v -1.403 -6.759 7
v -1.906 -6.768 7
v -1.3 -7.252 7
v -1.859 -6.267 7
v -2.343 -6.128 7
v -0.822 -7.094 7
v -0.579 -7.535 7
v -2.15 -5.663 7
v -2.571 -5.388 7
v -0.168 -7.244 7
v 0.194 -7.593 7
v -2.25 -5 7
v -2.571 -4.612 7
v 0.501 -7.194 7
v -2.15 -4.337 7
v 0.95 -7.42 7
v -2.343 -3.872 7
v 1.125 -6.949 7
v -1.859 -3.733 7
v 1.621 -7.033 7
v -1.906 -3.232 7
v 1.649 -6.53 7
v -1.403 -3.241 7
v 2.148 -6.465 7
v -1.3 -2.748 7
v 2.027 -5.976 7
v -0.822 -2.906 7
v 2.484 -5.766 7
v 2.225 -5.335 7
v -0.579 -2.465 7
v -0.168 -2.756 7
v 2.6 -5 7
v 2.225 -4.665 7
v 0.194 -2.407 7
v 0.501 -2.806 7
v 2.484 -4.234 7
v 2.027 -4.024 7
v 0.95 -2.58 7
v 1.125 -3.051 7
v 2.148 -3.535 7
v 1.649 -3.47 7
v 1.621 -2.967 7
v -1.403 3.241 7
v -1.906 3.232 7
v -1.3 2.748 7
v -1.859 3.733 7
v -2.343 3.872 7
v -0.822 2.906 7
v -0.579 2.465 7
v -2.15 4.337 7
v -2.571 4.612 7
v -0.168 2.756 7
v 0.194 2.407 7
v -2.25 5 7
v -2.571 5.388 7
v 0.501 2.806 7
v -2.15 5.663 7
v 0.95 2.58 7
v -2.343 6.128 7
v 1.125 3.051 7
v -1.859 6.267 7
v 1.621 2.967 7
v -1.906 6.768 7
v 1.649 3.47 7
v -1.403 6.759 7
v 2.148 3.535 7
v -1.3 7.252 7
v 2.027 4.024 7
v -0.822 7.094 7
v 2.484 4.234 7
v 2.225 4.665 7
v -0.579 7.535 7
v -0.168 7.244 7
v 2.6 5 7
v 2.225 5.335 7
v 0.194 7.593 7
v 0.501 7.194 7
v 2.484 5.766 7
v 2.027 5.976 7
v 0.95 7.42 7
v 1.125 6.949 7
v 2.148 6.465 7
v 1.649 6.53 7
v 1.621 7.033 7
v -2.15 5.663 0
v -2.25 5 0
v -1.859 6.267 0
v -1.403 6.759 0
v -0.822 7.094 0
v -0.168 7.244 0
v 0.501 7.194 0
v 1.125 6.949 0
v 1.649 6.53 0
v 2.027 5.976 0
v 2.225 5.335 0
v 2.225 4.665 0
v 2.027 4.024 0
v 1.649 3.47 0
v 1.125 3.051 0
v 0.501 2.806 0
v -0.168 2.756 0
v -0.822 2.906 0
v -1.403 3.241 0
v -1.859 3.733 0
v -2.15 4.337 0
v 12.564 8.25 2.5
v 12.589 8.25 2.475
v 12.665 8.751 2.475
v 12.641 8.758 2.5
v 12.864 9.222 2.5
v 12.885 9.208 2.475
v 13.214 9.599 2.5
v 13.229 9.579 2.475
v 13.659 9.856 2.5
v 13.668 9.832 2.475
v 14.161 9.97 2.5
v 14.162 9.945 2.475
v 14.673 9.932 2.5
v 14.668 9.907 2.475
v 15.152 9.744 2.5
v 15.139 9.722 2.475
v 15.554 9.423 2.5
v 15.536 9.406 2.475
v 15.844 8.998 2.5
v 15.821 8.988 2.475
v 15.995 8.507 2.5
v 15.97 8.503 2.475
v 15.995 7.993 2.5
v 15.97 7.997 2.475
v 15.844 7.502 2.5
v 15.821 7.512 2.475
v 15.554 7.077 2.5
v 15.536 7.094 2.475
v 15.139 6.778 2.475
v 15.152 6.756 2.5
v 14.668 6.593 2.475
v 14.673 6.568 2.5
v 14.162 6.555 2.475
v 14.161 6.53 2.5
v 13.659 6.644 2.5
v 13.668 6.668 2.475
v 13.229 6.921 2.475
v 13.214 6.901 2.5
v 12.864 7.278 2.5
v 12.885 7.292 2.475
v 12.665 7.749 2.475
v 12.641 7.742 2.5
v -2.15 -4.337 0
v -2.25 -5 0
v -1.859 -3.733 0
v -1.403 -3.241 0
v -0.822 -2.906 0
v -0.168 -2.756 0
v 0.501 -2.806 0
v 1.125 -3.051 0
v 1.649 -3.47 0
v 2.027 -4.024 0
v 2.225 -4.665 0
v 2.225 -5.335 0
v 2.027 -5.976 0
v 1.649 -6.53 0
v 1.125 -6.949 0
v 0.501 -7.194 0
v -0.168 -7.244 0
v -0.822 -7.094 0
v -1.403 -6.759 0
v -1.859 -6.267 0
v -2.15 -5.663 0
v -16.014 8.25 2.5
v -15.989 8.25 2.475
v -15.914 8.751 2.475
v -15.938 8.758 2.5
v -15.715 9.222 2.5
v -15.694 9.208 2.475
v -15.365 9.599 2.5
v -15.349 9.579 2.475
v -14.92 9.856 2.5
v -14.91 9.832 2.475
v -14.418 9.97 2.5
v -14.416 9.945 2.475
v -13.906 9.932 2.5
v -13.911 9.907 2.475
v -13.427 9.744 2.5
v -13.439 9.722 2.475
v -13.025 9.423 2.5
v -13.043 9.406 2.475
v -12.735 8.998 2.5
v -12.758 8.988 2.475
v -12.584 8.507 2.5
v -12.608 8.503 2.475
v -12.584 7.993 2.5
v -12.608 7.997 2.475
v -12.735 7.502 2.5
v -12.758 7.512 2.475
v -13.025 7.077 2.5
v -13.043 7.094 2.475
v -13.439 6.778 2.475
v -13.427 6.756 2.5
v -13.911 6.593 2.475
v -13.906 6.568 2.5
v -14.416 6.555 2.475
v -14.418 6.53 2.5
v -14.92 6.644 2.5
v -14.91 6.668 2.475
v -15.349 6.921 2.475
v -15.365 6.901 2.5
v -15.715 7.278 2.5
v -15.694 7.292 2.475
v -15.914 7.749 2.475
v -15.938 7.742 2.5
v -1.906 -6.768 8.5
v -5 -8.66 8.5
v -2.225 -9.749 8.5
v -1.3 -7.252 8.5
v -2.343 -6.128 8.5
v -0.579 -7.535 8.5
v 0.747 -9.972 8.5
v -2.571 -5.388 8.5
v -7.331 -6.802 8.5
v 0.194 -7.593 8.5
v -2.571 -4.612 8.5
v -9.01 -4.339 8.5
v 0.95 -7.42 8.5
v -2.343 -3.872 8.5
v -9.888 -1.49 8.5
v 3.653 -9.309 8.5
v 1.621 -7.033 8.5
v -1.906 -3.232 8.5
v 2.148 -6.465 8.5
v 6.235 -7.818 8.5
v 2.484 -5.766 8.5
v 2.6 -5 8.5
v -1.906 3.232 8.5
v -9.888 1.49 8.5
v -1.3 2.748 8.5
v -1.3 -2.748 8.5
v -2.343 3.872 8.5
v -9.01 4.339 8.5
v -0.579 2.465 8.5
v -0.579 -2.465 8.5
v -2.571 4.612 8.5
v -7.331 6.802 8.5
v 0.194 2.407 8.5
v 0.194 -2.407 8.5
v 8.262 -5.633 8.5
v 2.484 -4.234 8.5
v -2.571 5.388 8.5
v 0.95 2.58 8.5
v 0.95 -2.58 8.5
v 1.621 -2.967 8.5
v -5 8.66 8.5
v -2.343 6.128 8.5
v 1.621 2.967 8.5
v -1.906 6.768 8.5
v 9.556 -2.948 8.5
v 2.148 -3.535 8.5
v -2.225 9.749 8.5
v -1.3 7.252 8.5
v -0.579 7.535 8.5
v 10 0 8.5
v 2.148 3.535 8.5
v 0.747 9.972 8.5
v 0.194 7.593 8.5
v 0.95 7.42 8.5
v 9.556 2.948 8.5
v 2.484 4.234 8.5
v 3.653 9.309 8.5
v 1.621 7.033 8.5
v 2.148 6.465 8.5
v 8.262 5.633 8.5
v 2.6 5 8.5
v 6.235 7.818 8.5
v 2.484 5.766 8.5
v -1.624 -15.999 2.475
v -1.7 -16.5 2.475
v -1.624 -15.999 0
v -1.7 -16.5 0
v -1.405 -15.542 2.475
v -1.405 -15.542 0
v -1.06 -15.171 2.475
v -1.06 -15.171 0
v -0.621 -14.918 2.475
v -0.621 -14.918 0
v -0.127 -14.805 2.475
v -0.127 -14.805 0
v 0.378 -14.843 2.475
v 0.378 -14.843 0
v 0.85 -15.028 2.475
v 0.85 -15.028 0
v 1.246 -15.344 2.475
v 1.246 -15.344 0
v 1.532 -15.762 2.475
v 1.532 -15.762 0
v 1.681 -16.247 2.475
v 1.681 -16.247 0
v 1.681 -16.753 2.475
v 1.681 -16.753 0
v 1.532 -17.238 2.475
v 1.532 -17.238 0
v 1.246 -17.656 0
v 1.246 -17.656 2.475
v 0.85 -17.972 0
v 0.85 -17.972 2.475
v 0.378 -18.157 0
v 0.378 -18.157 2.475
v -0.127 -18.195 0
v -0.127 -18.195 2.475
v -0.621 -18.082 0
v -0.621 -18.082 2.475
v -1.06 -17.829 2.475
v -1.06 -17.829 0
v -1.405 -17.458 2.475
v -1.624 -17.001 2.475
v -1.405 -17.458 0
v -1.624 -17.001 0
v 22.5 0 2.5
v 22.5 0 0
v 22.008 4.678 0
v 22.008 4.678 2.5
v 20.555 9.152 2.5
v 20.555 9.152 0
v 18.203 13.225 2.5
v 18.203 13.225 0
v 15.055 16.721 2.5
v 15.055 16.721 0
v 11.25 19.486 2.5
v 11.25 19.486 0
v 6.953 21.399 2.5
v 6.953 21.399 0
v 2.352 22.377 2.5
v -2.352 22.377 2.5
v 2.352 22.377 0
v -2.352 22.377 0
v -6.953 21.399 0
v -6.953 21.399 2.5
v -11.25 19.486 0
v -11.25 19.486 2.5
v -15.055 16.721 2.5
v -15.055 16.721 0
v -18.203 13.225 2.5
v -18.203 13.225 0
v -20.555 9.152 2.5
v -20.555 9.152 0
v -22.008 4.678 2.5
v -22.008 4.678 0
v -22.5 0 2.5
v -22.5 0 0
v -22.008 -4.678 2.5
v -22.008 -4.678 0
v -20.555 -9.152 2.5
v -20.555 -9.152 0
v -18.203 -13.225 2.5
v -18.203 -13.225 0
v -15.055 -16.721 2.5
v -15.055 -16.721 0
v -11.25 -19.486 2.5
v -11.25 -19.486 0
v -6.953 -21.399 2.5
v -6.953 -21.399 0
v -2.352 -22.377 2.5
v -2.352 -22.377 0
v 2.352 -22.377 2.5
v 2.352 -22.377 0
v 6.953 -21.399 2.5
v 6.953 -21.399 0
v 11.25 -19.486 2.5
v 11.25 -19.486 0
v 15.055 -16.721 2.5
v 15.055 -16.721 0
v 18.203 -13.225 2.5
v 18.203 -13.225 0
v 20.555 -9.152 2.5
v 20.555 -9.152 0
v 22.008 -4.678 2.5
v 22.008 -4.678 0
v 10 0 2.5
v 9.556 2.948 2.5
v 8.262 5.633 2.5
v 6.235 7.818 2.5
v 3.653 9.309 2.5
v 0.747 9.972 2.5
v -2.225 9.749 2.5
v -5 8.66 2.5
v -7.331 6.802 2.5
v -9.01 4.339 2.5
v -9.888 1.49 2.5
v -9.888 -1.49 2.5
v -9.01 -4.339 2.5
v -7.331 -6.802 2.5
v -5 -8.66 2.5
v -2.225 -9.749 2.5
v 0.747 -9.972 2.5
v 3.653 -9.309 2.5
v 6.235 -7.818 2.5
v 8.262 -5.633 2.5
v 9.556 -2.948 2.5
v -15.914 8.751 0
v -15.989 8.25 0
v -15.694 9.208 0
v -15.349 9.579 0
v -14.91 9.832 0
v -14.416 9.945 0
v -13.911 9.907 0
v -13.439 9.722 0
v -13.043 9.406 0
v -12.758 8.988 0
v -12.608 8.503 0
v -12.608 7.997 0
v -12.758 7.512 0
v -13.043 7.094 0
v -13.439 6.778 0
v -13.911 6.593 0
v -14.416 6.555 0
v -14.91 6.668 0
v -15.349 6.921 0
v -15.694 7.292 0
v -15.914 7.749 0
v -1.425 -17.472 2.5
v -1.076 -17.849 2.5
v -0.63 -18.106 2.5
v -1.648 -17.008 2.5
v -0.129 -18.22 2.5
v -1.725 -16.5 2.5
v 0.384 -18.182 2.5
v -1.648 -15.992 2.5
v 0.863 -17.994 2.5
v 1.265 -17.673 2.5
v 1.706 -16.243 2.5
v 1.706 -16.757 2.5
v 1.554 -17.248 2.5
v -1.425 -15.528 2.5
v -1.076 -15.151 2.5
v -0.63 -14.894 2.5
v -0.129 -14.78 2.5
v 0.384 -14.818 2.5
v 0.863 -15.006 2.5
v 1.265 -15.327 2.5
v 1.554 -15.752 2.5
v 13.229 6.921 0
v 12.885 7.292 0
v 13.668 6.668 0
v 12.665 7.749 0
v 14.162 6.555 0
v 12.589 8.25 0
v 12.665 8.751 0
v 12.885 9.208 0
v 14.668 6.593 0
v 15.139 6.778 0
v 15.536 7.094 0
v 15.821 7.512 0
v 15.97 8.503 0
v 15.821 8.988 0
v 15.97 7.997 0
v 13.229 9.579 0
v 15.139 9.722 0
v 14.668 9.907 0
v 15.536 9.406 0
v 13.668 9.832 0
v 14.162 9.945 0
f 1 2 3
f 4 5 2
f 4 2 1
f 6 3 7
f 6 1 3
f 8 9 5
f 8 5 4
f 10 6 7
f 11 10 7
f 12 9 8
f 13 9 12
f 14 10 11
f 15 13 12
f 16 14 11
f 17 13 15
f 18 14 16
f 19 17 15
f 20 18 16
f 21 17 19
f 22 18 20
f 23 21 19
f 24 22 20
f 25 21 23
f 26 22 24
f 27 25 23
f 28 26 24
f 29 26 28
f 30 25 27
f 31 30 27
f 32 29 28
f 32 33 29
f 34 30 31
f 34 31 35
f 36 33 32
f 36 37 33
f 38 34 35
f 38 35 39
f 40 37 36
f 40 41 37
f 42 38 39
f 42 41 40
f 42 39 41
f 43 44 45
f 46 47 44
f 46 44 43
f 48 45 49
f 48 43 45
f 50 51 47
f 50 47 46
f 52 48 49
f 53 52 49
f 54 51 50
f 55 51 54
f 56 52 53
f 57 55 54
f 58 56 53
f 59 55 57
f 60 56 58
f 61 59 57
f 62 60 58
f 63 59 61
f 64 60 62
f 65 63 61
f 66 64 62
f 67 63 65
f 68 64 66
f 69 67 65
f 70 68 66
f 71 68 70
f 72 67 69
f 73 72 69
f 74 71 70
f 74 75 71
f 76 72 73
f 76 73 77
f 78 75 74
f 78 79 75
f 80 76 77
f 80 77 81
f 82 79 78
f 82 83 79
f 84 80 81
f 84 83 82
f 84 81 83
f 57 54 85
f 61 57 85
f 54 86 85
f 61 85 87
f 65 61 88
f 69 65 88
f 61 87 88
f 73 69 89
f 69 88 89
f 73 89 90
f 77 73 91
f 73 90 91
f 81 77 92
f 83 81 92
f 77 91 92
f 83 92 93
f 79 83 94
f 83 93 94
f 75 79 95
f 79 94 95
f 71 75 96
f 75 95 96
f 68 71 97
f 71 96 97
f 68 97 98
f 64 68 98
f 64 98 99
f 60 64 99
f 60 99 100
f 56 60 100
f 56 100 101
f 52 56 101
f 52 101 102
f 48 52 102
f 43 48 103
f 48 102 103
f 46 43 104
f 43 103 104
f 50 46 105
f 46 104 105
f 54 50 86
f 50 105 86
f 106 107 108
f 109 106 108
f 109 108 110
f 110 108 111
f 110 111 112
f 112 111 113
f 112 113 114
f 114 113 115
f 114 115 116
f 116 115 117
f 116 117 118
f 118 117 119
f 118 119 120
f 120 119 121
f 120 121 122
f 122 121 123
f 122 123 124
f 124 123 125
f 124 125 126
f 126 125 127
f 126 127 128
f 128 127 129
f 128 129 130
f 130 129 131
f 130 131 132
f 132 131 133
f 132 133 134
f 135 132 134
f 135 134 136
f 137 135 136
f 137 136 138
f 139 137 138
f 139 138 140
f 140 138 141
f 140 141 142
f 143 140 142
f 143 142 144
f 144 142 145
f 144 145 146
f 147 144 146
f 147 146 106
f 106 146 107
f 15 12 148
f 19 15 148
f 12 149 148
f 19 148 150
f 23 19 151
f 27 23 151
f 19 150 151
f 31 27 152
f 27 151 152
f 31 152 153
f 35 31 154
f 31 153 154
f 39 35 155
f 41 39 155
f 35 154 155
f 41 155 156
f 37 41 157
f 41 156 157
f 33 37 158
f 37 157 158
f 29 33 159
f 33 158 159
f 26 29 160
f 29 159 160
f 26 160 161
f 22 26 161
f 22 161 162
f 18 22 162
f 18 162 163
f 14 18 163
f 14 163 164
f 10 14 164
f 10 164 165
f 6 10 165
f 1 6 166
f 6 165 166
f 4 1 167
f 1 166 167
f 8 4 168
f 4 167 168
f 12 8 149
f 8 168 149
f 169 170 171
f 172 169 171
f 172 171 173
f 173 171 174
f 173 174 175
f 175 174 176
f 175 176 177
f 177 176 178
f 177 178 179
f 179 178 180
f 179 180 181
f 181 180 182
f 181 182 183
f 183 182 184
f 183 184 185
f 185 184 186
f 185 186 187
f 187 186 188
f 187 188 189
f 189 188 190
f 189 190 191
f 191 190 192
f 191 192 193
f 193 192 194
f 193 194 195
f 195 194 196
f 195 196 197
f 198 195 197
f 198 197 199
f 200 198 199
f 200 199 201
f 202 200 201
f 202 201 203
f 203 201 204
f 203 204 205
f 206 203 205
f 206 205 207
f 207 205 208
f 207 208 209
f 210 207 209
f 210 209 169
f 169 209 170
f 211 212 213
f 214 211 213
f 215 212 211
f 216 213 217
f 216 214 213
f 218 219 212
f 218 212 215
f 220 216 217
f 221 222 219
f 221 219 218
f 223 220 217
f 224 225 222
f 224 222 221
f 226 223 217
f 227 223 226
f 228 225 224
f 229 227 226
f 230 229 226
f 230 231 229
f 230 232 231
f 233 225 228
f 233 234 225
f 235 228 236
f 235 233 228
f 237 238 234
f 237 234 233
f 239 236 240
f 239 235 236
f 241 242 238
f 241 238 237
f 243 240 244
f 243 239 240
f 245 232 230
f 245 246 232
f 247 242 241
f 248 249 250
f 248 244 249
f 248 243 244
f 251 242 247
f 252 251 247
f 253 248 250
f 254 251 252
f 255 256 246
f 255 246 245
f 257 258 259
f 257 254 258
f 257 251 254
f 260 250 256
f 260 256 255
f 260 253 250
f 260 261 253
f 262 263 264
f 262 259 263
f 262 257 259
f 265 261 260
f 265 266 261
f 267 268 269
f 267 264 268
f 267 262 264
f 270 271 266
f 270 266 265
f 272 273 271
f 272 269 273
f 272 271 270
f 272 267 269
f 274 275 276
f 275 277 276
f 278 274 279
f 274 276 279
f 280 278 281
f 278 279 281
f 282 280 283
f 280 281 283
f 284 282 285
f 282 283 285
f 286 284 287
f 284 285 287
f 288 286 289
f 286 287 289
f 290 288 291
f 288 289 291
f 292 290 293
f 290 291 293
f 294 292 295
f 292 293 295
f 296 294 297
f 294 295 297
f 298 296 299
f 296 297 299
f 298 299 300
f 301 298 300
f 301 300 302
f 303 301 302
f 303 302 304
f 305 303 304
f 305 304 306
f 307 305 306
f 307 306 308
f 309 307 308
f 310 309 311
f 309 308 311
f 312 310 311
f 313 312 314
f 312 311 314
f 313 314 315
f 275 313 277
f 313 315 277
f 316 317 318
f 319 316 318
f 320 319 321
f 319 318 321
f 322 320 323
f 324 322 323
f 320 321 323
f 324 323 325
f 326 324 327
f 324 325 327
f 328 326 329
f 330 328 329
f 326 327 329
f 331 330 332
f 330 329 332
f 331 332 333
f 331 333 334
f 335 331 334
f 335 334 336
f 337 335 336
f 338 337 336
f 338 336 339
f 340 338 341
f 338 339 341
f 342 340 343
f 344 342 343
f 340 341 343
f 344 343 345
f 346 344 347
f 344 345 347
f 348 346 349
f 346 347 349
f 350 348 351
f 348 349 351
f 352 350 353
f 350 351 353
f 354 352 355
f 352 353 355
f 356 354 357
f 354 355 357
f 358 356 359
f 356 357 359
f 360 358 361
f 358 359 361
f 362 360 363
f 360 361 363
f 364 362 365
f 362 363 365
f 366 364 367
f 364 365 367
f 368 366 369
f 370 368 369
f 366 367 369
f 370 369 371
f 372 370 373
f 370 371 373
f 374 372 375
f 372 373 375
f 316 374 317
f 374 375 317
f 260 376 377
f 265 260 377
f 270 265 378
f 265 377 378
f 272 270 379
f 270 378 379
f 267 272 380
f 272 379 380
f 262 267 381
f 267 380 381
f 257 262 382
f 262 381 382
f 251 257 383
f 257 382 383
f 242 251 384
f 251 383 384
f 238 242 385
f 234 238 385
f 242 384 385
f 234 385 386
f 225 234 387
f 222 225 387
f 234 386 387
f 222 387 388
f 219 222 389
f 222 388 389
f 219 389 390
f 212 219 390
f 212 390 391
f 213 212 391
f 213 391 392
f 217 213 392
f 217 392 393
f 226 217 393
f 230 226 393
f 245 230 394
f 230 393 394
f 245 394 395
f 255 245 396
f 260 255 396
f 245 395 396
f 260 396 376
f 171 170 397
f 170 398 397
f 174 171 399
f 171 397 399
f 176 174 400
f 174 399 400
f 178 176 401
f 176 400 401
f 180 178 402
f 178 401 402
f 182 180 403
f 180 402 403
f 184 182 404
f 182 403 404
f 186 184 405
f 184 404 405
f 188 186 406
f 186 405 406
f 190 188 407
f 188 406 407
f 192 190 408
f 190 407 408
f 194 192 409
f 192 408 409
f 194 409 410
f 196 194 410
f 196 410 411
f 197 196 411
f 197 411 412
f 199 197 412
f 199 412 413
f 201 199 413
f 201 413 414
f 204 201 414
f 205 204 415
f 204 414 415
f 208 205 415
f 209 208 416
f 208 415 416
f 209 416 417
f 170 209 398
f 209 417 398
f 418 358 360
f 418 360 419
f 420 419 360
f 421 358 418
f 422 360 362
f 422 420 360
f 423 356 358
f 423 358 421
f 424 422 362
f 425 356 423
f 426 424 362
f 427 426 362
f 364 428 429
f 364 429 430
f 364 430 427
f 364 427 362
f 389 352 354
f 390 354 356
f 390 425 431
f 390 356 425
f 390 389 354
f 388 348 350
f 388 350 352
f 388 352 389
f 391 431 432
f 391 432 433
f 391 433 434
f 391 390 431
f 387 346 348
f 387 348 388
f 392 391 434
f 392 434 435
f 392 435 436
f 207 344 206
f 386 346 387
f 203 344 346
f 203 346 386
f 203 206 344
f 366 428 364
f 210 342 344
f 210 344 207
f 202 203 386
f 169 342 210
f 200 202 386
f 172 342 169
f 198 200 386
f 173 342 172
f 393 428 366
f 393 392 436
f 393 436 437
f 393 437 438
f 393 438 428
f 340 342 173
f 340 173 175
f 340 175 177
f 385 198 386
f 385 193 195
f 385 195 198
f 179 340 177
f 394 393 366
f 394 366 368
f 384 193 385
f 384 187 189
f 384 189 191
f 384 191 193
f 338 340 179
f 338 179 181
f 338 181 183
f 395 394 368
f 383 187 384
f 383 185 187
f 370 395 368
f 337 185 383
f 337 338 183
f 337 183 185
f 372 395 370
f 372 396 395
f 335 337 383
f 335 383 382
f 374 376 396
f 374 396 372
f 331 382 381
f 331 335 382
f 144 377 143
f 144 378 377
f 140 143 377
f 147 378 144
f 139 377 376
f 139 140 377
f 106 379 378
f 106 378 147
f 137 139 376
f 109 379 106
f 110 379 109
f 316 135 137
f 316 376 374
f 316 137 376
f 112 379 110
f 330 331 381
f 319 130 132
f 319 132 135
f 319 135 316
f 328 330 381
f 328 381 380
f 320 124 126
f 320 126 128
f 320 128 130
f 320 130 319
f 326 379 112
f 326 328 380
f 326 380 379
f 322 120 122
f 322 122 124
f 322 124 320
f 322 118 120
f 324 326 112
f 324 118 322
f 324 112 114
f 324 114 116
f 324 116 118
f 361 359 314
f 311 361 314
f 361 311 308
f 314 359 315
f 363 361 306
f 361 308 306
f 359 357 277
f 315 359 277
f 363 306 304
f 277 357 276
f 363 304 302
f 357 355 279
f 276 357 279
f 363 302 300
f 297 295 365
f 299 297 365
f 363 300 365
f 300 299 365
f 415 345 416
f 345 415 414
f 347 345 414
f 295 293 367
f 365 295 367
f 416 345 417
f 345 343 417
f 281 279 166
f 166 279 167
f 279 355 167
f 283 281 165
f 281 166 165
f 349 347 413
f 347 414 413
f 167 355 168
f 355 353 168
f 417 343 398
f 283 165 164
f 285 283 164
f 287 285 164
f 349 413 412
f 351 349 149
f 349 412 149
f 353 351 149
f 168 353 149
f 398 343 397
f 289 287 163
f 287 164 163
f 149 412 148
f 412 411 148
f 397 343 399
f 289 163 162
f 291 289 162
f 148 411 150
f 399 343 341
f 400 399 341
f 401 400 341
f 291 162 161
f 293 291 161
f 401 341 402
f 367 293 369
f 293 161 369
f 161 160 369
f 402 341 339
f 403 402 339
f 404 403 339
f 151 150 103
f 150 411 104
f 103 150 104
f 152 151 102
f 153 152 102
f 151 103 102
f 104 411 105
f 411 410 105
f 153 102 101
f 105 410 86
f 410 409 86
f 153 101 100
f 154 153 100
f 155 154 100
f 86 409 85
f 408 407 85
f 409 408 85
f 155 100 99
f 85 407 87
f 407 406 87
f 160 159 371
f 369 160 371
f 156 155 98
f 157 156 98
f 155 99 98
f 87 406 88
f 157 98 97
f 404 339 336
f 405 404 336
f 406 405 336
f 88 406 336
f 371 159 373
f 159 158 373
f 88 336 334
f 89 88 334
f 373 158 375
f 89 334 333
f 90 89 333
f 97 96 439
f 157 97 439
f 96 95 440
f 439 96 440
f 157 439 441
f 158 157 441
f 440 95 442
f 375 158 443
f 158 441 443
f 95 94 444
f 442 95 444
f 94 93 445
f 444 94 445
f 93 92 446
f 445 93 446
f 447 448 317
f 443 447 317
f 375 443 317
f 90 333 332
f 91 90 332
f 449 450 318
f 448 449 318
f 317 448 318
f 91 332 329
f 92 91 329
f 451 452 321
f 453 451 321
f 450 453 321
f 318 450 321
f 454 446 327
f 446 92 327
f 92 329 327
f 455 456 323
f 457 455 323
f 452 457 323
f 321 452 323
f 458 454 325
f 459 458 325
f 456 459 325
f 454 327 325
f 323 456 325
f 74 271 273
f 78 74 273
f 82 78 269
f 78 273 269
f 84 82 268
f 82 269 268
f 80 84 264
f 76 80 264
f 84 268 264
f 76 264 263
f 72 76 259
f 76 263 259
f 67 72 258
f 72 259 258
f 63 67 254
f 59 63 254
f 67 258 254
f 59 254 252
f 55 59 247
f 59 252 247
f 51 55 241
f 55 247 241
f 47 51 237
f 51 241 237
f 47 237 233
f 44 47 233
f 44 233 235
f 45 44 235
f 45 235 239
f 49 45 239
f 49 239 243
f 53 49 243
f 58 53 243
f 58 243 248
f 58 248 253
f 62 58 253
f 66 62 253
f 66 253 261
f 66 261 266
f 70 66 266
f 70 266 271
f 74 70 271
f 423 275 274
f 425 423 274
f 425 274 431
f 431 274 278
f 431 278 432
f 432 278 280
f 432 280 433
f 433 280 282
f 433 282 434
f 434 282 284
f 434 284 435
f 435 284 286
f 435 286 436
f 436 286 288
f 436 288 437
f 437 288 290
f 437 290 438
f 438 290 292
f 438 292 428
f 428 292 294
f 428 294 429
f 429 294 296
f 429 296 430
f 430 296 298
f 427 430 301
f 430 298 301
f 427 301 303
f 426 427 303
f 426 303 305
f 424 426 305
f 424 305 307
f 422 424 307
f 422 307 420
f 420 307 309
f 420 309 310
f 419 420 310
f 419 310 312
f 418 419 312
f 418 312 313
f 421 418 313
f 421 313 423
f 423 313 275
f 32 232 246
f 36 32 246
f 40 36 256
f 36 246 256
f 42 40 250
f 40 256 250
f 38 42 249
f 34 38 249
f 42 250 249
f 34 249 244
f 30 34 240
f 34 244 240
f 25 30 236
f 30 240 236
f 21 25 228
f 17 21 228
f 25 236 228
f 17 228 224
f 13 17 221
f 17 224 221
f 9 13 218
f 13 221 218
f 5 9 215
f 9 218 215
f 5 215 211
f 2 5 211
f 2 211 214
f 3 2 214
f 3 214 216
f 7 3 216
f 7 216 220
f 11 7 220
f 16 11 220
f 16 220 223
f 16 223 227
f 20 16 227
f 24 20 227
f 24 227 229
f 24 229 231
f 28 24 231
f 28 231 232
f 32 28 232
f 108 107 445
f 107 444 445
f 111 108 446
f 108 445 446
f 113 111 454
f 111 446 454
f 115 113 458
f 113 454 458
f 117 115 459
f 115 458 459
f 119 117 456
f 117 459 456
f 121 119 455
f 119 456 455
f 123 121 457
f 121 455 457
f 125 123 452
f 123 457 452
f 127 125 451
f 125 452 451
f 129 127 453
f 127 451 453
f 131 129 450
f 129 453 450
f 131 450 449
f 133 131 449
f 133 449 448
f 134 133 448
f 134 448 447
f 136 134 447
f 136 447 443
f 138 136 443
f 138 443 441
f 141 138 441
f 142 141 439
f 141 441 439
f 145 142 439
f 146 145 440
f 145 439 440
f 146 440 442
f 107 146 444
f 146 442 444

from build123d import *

# Parameters (mm, degrees)
SKETCH1_R                      = 22.5
BOSS_EXTRUDE1_DEPTH            = 2.5
M3_CLEARANCE_HOLE1_D           = 3.4
M3_CLEARANCE_HOLE1_CSINK_D     = 3.45
M3_CLEARANCE_HOLE1_CSINK_ANGLE = 90
SKETCH6_R                      = 10
BOSS_EXTRUDE2_DEPTH            = 6
HOLE2_D                        = 4.5
HOLE2_CBORE_D                  = 5.2
HOLE2_CBORE_DEPTH              = 1.5


with BuildPart() as part:
    # Sketch1 → Boss-Extrude1 (new body)
    with BuildSketch(Plane.XY):
        Circle(SKETCH1_R)
    extrude(amount=BOSS_EXTRUDE1_DEPTH)

    # M3 Clearance Hole1 (through all)
    with Locations(Plane.XY.offset(2.5)):
        with Locations((-14.289419162, 8.25), (14.289419162, 8.25), (0, -16.5)):
            CounterSinkHole(M3_CLEARANCE_HOLE1_D / 2, M3_CLEARANCE_HOLE1_CSINK_D / 2, counter_sink_angle=M3_CLEARANCE_HOLE1_CSINK_ANGLE)

    # Sketch6 → Boss-Extrude2 (add)
    with BuildSketch(Plane.XY.offset(2.5)):
        Circle(SKETCH6_R)
    extrude(amount=BOSS_EXTRUDE2_DEPTH)

    # Hole2 (through all)
    with Locations(Plane.XY.offset(8.5)):
        with Locations((0, 5), (0, -5)):
            CounterBoreHole(HOLE2_D / 2, HOLE2_CBORE_D / 2, HOLE2_CBORE_DEPTH)


solid = part.part
